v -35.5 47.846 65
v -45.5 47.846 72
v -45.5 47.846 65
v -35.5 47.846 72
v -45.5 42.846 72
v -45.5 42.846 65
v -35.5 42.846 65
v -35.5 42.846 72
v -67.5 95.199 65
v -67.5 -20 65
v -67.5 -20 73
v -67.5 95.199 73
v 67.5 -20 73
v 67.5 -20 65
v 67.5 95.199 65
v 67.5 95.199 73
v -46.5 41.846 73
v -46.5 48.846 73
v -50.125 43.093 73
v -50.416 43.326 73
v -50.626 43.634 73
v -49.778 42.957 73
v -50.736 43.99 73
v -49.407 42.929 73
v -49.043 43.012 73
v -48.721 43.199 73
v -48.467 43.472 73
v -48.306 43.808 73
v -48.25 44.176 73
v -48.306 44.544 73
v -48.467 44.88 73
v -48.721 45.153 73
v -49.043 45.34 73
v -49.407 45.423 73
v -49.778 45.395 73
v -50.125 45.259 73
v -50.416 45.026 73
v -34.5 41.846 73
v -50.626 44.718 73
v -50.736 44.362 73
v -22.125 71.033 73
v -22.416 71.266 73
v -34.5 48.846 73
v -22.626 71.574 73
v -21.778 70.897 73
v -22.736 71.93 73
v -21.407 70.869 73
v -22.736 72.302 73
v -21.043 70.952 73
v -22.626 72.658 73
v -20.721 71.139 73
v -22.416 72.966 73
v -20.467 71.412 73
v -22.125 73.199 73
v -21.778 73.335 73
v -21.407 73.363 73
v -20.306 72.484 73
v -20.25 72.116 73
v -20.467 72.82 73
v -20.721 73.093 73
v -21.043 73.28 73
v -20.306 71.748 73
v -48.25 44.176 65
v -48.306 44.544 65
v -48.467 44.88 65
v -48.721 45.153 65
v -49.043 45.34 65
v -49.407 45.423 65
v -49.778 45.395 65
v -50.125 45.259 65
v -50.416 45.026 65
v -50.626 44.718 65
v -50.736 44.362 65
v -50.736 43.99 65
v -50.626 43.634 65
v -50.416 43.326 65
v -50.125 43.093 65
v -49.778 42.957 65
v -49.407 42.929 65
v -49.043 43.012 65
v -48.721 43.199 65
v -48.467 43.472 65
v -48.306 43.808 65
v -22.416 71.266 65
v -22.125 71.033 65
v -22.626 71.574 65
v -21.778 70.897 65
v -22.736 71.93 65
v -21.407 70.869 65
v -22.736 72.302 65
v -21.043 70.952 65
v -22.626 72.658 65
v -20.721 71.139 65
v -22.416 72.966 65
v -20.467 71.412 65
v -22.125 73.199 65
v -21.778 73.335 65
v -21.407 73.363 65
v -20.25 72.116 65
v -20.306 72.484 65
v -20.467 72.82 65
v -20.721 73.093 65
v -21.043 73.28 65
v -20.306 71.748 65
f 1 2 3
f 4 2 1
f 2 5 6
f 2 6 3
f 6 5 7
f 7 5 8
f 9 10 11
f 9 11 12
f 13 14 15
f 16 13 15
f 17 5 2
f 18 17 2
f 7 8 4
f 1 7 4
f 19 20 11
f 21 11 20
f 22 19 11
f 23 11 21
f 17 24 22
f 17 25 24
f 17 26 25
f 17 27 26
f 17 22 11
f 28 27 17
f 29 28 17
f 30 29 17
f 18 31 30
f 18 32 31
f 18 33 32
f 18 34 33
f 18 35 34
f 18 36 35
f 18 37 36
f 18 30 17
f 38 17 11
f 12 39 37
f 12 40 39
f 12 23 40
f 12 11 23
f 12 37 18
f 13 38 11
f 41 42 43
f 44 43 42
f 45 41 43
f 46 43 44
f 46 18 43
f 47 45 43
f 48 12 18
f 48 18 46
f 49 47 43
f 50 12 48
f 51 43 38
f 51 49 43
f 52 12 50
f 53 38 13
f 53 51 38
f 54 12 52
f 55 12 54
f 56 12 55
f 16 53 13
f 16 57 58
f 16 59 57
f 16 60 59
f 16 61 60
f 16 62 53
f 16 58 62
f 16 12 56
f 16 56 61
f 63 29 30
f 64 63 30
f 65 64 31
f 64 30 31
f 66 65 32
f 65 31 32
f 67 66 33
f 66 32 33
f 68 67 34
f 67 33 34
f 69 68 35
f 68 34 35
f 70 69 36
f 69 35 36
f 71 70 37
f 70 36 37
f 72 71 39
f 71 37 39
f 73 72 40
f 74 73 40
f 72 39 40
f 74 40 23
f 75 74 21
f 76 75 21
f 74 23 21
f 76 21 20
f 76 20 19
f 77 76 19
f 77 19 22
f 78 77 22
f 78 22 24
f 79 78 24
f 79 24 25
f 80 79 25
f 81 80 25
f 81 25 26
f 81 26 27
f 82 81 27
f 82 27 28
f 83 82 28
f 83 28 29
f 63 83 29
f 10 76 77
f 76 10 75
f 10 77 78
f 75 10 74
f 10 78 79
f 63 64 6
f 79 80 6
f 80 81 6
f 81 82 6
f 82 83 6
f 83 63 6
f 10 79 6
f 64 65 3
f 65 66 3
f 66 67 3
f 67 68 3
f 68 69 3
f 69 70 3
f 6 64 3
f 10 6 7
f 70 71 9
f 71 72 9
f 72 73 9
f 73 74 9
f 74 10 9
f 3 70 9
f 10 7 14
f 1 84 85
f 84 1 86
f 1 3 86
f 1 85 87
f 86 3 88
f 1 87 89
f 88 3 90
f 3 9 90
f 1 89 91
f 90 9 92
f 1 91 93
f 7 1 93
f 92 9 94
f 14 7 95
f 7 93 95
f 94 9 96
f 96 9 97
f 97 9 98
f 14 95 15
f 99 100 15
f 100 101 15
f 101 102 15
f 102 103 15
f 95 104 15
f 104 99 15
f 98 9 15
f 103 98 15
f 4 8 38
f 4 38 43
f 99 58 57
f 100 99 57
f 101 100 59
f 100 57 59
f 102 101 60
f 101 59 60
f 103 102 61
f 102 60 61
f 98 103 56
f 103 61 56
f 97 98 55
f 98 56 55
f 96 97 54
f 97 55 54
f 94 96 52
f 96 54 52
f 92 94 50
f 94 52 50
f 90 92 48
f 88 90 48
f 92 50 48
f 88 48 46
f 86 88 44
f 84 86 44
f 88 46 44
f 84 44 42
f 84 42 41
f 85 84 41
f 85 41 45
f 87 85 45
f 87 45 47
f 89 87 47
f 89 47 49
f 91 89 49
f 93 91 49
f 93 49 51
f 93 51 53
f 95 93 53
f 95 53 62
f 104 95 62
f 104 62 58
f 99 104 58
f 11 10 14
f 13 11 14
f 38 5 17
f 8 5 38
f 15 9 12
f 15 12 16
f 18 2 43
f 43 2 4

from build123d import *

# Parameters (mm, degrees)
BOSS_EXTRUDE1_START = 65
SKETCH1_W           = 135
SKETCH1_H           = 115.198794821
BOSS_EXTRUDE1_DEPTH = 8
SKETCH2_W           = 10
SKETCH2_H           = 5
CUT_EXTRUDE1_DEPTH  = 9
SKETCH3_R           = 1.25
CUT_EXTRUDE2_DEPTH  = 9
CHAMFER2_SIZE       = 1


with BuildPart() as part:
    # Sketch1 → Boss-Extrude1 (new body)
    with BuildSketch(Plane.XY.offset(BOSS_EXTRUDE1_START)):
        with Locations((0, 37.599397411)):
            Rectangle(SKETCH1_W, SKETCH1_H)
    extrude(amount=BOSS_EXTRUDE1_DEPTH)

    # Sketch2 → Cut-Extrude1 (cut, through all)
    with BuildSketch(Plane.XY.offset(73)):
        with Locations((-40.5, 45.346)):
            Rectangle(SKETCH2_W, SKETCH2_H)
    extrude(amount=-CUT_EXTRUDE1_DEPTH, mode=Mode.SUBTRACT)

    # Sketch3 → Cut-Extrude2 (cut, through all)
    with BuildSketch(Plane.XY.offset(73)):
        with Locations((-21.5, 72.116)):
            Circle(SKETCH3_R)
        with Locations((-49.5, 44.176)):
            Circle(SKETCH3_R)
    extrude(amount=-CUT_EXTRUDE2_DEPTH, mode=Mode.SUBTRACT)

    # Chamfer2
    chamfer2_edges = [part.edges().sort_by_distance(p)[0] for p in [
        (-40.5, 47.846, 73),
        (-45.5, 45.346, 73),
        (-40.5, 42.846, 73),
        (-35.5, 45.346, 73),
    ]]
    chamfer(chamfer2_edges, length=CHAMFER2_SIZE)


solid = part.part
